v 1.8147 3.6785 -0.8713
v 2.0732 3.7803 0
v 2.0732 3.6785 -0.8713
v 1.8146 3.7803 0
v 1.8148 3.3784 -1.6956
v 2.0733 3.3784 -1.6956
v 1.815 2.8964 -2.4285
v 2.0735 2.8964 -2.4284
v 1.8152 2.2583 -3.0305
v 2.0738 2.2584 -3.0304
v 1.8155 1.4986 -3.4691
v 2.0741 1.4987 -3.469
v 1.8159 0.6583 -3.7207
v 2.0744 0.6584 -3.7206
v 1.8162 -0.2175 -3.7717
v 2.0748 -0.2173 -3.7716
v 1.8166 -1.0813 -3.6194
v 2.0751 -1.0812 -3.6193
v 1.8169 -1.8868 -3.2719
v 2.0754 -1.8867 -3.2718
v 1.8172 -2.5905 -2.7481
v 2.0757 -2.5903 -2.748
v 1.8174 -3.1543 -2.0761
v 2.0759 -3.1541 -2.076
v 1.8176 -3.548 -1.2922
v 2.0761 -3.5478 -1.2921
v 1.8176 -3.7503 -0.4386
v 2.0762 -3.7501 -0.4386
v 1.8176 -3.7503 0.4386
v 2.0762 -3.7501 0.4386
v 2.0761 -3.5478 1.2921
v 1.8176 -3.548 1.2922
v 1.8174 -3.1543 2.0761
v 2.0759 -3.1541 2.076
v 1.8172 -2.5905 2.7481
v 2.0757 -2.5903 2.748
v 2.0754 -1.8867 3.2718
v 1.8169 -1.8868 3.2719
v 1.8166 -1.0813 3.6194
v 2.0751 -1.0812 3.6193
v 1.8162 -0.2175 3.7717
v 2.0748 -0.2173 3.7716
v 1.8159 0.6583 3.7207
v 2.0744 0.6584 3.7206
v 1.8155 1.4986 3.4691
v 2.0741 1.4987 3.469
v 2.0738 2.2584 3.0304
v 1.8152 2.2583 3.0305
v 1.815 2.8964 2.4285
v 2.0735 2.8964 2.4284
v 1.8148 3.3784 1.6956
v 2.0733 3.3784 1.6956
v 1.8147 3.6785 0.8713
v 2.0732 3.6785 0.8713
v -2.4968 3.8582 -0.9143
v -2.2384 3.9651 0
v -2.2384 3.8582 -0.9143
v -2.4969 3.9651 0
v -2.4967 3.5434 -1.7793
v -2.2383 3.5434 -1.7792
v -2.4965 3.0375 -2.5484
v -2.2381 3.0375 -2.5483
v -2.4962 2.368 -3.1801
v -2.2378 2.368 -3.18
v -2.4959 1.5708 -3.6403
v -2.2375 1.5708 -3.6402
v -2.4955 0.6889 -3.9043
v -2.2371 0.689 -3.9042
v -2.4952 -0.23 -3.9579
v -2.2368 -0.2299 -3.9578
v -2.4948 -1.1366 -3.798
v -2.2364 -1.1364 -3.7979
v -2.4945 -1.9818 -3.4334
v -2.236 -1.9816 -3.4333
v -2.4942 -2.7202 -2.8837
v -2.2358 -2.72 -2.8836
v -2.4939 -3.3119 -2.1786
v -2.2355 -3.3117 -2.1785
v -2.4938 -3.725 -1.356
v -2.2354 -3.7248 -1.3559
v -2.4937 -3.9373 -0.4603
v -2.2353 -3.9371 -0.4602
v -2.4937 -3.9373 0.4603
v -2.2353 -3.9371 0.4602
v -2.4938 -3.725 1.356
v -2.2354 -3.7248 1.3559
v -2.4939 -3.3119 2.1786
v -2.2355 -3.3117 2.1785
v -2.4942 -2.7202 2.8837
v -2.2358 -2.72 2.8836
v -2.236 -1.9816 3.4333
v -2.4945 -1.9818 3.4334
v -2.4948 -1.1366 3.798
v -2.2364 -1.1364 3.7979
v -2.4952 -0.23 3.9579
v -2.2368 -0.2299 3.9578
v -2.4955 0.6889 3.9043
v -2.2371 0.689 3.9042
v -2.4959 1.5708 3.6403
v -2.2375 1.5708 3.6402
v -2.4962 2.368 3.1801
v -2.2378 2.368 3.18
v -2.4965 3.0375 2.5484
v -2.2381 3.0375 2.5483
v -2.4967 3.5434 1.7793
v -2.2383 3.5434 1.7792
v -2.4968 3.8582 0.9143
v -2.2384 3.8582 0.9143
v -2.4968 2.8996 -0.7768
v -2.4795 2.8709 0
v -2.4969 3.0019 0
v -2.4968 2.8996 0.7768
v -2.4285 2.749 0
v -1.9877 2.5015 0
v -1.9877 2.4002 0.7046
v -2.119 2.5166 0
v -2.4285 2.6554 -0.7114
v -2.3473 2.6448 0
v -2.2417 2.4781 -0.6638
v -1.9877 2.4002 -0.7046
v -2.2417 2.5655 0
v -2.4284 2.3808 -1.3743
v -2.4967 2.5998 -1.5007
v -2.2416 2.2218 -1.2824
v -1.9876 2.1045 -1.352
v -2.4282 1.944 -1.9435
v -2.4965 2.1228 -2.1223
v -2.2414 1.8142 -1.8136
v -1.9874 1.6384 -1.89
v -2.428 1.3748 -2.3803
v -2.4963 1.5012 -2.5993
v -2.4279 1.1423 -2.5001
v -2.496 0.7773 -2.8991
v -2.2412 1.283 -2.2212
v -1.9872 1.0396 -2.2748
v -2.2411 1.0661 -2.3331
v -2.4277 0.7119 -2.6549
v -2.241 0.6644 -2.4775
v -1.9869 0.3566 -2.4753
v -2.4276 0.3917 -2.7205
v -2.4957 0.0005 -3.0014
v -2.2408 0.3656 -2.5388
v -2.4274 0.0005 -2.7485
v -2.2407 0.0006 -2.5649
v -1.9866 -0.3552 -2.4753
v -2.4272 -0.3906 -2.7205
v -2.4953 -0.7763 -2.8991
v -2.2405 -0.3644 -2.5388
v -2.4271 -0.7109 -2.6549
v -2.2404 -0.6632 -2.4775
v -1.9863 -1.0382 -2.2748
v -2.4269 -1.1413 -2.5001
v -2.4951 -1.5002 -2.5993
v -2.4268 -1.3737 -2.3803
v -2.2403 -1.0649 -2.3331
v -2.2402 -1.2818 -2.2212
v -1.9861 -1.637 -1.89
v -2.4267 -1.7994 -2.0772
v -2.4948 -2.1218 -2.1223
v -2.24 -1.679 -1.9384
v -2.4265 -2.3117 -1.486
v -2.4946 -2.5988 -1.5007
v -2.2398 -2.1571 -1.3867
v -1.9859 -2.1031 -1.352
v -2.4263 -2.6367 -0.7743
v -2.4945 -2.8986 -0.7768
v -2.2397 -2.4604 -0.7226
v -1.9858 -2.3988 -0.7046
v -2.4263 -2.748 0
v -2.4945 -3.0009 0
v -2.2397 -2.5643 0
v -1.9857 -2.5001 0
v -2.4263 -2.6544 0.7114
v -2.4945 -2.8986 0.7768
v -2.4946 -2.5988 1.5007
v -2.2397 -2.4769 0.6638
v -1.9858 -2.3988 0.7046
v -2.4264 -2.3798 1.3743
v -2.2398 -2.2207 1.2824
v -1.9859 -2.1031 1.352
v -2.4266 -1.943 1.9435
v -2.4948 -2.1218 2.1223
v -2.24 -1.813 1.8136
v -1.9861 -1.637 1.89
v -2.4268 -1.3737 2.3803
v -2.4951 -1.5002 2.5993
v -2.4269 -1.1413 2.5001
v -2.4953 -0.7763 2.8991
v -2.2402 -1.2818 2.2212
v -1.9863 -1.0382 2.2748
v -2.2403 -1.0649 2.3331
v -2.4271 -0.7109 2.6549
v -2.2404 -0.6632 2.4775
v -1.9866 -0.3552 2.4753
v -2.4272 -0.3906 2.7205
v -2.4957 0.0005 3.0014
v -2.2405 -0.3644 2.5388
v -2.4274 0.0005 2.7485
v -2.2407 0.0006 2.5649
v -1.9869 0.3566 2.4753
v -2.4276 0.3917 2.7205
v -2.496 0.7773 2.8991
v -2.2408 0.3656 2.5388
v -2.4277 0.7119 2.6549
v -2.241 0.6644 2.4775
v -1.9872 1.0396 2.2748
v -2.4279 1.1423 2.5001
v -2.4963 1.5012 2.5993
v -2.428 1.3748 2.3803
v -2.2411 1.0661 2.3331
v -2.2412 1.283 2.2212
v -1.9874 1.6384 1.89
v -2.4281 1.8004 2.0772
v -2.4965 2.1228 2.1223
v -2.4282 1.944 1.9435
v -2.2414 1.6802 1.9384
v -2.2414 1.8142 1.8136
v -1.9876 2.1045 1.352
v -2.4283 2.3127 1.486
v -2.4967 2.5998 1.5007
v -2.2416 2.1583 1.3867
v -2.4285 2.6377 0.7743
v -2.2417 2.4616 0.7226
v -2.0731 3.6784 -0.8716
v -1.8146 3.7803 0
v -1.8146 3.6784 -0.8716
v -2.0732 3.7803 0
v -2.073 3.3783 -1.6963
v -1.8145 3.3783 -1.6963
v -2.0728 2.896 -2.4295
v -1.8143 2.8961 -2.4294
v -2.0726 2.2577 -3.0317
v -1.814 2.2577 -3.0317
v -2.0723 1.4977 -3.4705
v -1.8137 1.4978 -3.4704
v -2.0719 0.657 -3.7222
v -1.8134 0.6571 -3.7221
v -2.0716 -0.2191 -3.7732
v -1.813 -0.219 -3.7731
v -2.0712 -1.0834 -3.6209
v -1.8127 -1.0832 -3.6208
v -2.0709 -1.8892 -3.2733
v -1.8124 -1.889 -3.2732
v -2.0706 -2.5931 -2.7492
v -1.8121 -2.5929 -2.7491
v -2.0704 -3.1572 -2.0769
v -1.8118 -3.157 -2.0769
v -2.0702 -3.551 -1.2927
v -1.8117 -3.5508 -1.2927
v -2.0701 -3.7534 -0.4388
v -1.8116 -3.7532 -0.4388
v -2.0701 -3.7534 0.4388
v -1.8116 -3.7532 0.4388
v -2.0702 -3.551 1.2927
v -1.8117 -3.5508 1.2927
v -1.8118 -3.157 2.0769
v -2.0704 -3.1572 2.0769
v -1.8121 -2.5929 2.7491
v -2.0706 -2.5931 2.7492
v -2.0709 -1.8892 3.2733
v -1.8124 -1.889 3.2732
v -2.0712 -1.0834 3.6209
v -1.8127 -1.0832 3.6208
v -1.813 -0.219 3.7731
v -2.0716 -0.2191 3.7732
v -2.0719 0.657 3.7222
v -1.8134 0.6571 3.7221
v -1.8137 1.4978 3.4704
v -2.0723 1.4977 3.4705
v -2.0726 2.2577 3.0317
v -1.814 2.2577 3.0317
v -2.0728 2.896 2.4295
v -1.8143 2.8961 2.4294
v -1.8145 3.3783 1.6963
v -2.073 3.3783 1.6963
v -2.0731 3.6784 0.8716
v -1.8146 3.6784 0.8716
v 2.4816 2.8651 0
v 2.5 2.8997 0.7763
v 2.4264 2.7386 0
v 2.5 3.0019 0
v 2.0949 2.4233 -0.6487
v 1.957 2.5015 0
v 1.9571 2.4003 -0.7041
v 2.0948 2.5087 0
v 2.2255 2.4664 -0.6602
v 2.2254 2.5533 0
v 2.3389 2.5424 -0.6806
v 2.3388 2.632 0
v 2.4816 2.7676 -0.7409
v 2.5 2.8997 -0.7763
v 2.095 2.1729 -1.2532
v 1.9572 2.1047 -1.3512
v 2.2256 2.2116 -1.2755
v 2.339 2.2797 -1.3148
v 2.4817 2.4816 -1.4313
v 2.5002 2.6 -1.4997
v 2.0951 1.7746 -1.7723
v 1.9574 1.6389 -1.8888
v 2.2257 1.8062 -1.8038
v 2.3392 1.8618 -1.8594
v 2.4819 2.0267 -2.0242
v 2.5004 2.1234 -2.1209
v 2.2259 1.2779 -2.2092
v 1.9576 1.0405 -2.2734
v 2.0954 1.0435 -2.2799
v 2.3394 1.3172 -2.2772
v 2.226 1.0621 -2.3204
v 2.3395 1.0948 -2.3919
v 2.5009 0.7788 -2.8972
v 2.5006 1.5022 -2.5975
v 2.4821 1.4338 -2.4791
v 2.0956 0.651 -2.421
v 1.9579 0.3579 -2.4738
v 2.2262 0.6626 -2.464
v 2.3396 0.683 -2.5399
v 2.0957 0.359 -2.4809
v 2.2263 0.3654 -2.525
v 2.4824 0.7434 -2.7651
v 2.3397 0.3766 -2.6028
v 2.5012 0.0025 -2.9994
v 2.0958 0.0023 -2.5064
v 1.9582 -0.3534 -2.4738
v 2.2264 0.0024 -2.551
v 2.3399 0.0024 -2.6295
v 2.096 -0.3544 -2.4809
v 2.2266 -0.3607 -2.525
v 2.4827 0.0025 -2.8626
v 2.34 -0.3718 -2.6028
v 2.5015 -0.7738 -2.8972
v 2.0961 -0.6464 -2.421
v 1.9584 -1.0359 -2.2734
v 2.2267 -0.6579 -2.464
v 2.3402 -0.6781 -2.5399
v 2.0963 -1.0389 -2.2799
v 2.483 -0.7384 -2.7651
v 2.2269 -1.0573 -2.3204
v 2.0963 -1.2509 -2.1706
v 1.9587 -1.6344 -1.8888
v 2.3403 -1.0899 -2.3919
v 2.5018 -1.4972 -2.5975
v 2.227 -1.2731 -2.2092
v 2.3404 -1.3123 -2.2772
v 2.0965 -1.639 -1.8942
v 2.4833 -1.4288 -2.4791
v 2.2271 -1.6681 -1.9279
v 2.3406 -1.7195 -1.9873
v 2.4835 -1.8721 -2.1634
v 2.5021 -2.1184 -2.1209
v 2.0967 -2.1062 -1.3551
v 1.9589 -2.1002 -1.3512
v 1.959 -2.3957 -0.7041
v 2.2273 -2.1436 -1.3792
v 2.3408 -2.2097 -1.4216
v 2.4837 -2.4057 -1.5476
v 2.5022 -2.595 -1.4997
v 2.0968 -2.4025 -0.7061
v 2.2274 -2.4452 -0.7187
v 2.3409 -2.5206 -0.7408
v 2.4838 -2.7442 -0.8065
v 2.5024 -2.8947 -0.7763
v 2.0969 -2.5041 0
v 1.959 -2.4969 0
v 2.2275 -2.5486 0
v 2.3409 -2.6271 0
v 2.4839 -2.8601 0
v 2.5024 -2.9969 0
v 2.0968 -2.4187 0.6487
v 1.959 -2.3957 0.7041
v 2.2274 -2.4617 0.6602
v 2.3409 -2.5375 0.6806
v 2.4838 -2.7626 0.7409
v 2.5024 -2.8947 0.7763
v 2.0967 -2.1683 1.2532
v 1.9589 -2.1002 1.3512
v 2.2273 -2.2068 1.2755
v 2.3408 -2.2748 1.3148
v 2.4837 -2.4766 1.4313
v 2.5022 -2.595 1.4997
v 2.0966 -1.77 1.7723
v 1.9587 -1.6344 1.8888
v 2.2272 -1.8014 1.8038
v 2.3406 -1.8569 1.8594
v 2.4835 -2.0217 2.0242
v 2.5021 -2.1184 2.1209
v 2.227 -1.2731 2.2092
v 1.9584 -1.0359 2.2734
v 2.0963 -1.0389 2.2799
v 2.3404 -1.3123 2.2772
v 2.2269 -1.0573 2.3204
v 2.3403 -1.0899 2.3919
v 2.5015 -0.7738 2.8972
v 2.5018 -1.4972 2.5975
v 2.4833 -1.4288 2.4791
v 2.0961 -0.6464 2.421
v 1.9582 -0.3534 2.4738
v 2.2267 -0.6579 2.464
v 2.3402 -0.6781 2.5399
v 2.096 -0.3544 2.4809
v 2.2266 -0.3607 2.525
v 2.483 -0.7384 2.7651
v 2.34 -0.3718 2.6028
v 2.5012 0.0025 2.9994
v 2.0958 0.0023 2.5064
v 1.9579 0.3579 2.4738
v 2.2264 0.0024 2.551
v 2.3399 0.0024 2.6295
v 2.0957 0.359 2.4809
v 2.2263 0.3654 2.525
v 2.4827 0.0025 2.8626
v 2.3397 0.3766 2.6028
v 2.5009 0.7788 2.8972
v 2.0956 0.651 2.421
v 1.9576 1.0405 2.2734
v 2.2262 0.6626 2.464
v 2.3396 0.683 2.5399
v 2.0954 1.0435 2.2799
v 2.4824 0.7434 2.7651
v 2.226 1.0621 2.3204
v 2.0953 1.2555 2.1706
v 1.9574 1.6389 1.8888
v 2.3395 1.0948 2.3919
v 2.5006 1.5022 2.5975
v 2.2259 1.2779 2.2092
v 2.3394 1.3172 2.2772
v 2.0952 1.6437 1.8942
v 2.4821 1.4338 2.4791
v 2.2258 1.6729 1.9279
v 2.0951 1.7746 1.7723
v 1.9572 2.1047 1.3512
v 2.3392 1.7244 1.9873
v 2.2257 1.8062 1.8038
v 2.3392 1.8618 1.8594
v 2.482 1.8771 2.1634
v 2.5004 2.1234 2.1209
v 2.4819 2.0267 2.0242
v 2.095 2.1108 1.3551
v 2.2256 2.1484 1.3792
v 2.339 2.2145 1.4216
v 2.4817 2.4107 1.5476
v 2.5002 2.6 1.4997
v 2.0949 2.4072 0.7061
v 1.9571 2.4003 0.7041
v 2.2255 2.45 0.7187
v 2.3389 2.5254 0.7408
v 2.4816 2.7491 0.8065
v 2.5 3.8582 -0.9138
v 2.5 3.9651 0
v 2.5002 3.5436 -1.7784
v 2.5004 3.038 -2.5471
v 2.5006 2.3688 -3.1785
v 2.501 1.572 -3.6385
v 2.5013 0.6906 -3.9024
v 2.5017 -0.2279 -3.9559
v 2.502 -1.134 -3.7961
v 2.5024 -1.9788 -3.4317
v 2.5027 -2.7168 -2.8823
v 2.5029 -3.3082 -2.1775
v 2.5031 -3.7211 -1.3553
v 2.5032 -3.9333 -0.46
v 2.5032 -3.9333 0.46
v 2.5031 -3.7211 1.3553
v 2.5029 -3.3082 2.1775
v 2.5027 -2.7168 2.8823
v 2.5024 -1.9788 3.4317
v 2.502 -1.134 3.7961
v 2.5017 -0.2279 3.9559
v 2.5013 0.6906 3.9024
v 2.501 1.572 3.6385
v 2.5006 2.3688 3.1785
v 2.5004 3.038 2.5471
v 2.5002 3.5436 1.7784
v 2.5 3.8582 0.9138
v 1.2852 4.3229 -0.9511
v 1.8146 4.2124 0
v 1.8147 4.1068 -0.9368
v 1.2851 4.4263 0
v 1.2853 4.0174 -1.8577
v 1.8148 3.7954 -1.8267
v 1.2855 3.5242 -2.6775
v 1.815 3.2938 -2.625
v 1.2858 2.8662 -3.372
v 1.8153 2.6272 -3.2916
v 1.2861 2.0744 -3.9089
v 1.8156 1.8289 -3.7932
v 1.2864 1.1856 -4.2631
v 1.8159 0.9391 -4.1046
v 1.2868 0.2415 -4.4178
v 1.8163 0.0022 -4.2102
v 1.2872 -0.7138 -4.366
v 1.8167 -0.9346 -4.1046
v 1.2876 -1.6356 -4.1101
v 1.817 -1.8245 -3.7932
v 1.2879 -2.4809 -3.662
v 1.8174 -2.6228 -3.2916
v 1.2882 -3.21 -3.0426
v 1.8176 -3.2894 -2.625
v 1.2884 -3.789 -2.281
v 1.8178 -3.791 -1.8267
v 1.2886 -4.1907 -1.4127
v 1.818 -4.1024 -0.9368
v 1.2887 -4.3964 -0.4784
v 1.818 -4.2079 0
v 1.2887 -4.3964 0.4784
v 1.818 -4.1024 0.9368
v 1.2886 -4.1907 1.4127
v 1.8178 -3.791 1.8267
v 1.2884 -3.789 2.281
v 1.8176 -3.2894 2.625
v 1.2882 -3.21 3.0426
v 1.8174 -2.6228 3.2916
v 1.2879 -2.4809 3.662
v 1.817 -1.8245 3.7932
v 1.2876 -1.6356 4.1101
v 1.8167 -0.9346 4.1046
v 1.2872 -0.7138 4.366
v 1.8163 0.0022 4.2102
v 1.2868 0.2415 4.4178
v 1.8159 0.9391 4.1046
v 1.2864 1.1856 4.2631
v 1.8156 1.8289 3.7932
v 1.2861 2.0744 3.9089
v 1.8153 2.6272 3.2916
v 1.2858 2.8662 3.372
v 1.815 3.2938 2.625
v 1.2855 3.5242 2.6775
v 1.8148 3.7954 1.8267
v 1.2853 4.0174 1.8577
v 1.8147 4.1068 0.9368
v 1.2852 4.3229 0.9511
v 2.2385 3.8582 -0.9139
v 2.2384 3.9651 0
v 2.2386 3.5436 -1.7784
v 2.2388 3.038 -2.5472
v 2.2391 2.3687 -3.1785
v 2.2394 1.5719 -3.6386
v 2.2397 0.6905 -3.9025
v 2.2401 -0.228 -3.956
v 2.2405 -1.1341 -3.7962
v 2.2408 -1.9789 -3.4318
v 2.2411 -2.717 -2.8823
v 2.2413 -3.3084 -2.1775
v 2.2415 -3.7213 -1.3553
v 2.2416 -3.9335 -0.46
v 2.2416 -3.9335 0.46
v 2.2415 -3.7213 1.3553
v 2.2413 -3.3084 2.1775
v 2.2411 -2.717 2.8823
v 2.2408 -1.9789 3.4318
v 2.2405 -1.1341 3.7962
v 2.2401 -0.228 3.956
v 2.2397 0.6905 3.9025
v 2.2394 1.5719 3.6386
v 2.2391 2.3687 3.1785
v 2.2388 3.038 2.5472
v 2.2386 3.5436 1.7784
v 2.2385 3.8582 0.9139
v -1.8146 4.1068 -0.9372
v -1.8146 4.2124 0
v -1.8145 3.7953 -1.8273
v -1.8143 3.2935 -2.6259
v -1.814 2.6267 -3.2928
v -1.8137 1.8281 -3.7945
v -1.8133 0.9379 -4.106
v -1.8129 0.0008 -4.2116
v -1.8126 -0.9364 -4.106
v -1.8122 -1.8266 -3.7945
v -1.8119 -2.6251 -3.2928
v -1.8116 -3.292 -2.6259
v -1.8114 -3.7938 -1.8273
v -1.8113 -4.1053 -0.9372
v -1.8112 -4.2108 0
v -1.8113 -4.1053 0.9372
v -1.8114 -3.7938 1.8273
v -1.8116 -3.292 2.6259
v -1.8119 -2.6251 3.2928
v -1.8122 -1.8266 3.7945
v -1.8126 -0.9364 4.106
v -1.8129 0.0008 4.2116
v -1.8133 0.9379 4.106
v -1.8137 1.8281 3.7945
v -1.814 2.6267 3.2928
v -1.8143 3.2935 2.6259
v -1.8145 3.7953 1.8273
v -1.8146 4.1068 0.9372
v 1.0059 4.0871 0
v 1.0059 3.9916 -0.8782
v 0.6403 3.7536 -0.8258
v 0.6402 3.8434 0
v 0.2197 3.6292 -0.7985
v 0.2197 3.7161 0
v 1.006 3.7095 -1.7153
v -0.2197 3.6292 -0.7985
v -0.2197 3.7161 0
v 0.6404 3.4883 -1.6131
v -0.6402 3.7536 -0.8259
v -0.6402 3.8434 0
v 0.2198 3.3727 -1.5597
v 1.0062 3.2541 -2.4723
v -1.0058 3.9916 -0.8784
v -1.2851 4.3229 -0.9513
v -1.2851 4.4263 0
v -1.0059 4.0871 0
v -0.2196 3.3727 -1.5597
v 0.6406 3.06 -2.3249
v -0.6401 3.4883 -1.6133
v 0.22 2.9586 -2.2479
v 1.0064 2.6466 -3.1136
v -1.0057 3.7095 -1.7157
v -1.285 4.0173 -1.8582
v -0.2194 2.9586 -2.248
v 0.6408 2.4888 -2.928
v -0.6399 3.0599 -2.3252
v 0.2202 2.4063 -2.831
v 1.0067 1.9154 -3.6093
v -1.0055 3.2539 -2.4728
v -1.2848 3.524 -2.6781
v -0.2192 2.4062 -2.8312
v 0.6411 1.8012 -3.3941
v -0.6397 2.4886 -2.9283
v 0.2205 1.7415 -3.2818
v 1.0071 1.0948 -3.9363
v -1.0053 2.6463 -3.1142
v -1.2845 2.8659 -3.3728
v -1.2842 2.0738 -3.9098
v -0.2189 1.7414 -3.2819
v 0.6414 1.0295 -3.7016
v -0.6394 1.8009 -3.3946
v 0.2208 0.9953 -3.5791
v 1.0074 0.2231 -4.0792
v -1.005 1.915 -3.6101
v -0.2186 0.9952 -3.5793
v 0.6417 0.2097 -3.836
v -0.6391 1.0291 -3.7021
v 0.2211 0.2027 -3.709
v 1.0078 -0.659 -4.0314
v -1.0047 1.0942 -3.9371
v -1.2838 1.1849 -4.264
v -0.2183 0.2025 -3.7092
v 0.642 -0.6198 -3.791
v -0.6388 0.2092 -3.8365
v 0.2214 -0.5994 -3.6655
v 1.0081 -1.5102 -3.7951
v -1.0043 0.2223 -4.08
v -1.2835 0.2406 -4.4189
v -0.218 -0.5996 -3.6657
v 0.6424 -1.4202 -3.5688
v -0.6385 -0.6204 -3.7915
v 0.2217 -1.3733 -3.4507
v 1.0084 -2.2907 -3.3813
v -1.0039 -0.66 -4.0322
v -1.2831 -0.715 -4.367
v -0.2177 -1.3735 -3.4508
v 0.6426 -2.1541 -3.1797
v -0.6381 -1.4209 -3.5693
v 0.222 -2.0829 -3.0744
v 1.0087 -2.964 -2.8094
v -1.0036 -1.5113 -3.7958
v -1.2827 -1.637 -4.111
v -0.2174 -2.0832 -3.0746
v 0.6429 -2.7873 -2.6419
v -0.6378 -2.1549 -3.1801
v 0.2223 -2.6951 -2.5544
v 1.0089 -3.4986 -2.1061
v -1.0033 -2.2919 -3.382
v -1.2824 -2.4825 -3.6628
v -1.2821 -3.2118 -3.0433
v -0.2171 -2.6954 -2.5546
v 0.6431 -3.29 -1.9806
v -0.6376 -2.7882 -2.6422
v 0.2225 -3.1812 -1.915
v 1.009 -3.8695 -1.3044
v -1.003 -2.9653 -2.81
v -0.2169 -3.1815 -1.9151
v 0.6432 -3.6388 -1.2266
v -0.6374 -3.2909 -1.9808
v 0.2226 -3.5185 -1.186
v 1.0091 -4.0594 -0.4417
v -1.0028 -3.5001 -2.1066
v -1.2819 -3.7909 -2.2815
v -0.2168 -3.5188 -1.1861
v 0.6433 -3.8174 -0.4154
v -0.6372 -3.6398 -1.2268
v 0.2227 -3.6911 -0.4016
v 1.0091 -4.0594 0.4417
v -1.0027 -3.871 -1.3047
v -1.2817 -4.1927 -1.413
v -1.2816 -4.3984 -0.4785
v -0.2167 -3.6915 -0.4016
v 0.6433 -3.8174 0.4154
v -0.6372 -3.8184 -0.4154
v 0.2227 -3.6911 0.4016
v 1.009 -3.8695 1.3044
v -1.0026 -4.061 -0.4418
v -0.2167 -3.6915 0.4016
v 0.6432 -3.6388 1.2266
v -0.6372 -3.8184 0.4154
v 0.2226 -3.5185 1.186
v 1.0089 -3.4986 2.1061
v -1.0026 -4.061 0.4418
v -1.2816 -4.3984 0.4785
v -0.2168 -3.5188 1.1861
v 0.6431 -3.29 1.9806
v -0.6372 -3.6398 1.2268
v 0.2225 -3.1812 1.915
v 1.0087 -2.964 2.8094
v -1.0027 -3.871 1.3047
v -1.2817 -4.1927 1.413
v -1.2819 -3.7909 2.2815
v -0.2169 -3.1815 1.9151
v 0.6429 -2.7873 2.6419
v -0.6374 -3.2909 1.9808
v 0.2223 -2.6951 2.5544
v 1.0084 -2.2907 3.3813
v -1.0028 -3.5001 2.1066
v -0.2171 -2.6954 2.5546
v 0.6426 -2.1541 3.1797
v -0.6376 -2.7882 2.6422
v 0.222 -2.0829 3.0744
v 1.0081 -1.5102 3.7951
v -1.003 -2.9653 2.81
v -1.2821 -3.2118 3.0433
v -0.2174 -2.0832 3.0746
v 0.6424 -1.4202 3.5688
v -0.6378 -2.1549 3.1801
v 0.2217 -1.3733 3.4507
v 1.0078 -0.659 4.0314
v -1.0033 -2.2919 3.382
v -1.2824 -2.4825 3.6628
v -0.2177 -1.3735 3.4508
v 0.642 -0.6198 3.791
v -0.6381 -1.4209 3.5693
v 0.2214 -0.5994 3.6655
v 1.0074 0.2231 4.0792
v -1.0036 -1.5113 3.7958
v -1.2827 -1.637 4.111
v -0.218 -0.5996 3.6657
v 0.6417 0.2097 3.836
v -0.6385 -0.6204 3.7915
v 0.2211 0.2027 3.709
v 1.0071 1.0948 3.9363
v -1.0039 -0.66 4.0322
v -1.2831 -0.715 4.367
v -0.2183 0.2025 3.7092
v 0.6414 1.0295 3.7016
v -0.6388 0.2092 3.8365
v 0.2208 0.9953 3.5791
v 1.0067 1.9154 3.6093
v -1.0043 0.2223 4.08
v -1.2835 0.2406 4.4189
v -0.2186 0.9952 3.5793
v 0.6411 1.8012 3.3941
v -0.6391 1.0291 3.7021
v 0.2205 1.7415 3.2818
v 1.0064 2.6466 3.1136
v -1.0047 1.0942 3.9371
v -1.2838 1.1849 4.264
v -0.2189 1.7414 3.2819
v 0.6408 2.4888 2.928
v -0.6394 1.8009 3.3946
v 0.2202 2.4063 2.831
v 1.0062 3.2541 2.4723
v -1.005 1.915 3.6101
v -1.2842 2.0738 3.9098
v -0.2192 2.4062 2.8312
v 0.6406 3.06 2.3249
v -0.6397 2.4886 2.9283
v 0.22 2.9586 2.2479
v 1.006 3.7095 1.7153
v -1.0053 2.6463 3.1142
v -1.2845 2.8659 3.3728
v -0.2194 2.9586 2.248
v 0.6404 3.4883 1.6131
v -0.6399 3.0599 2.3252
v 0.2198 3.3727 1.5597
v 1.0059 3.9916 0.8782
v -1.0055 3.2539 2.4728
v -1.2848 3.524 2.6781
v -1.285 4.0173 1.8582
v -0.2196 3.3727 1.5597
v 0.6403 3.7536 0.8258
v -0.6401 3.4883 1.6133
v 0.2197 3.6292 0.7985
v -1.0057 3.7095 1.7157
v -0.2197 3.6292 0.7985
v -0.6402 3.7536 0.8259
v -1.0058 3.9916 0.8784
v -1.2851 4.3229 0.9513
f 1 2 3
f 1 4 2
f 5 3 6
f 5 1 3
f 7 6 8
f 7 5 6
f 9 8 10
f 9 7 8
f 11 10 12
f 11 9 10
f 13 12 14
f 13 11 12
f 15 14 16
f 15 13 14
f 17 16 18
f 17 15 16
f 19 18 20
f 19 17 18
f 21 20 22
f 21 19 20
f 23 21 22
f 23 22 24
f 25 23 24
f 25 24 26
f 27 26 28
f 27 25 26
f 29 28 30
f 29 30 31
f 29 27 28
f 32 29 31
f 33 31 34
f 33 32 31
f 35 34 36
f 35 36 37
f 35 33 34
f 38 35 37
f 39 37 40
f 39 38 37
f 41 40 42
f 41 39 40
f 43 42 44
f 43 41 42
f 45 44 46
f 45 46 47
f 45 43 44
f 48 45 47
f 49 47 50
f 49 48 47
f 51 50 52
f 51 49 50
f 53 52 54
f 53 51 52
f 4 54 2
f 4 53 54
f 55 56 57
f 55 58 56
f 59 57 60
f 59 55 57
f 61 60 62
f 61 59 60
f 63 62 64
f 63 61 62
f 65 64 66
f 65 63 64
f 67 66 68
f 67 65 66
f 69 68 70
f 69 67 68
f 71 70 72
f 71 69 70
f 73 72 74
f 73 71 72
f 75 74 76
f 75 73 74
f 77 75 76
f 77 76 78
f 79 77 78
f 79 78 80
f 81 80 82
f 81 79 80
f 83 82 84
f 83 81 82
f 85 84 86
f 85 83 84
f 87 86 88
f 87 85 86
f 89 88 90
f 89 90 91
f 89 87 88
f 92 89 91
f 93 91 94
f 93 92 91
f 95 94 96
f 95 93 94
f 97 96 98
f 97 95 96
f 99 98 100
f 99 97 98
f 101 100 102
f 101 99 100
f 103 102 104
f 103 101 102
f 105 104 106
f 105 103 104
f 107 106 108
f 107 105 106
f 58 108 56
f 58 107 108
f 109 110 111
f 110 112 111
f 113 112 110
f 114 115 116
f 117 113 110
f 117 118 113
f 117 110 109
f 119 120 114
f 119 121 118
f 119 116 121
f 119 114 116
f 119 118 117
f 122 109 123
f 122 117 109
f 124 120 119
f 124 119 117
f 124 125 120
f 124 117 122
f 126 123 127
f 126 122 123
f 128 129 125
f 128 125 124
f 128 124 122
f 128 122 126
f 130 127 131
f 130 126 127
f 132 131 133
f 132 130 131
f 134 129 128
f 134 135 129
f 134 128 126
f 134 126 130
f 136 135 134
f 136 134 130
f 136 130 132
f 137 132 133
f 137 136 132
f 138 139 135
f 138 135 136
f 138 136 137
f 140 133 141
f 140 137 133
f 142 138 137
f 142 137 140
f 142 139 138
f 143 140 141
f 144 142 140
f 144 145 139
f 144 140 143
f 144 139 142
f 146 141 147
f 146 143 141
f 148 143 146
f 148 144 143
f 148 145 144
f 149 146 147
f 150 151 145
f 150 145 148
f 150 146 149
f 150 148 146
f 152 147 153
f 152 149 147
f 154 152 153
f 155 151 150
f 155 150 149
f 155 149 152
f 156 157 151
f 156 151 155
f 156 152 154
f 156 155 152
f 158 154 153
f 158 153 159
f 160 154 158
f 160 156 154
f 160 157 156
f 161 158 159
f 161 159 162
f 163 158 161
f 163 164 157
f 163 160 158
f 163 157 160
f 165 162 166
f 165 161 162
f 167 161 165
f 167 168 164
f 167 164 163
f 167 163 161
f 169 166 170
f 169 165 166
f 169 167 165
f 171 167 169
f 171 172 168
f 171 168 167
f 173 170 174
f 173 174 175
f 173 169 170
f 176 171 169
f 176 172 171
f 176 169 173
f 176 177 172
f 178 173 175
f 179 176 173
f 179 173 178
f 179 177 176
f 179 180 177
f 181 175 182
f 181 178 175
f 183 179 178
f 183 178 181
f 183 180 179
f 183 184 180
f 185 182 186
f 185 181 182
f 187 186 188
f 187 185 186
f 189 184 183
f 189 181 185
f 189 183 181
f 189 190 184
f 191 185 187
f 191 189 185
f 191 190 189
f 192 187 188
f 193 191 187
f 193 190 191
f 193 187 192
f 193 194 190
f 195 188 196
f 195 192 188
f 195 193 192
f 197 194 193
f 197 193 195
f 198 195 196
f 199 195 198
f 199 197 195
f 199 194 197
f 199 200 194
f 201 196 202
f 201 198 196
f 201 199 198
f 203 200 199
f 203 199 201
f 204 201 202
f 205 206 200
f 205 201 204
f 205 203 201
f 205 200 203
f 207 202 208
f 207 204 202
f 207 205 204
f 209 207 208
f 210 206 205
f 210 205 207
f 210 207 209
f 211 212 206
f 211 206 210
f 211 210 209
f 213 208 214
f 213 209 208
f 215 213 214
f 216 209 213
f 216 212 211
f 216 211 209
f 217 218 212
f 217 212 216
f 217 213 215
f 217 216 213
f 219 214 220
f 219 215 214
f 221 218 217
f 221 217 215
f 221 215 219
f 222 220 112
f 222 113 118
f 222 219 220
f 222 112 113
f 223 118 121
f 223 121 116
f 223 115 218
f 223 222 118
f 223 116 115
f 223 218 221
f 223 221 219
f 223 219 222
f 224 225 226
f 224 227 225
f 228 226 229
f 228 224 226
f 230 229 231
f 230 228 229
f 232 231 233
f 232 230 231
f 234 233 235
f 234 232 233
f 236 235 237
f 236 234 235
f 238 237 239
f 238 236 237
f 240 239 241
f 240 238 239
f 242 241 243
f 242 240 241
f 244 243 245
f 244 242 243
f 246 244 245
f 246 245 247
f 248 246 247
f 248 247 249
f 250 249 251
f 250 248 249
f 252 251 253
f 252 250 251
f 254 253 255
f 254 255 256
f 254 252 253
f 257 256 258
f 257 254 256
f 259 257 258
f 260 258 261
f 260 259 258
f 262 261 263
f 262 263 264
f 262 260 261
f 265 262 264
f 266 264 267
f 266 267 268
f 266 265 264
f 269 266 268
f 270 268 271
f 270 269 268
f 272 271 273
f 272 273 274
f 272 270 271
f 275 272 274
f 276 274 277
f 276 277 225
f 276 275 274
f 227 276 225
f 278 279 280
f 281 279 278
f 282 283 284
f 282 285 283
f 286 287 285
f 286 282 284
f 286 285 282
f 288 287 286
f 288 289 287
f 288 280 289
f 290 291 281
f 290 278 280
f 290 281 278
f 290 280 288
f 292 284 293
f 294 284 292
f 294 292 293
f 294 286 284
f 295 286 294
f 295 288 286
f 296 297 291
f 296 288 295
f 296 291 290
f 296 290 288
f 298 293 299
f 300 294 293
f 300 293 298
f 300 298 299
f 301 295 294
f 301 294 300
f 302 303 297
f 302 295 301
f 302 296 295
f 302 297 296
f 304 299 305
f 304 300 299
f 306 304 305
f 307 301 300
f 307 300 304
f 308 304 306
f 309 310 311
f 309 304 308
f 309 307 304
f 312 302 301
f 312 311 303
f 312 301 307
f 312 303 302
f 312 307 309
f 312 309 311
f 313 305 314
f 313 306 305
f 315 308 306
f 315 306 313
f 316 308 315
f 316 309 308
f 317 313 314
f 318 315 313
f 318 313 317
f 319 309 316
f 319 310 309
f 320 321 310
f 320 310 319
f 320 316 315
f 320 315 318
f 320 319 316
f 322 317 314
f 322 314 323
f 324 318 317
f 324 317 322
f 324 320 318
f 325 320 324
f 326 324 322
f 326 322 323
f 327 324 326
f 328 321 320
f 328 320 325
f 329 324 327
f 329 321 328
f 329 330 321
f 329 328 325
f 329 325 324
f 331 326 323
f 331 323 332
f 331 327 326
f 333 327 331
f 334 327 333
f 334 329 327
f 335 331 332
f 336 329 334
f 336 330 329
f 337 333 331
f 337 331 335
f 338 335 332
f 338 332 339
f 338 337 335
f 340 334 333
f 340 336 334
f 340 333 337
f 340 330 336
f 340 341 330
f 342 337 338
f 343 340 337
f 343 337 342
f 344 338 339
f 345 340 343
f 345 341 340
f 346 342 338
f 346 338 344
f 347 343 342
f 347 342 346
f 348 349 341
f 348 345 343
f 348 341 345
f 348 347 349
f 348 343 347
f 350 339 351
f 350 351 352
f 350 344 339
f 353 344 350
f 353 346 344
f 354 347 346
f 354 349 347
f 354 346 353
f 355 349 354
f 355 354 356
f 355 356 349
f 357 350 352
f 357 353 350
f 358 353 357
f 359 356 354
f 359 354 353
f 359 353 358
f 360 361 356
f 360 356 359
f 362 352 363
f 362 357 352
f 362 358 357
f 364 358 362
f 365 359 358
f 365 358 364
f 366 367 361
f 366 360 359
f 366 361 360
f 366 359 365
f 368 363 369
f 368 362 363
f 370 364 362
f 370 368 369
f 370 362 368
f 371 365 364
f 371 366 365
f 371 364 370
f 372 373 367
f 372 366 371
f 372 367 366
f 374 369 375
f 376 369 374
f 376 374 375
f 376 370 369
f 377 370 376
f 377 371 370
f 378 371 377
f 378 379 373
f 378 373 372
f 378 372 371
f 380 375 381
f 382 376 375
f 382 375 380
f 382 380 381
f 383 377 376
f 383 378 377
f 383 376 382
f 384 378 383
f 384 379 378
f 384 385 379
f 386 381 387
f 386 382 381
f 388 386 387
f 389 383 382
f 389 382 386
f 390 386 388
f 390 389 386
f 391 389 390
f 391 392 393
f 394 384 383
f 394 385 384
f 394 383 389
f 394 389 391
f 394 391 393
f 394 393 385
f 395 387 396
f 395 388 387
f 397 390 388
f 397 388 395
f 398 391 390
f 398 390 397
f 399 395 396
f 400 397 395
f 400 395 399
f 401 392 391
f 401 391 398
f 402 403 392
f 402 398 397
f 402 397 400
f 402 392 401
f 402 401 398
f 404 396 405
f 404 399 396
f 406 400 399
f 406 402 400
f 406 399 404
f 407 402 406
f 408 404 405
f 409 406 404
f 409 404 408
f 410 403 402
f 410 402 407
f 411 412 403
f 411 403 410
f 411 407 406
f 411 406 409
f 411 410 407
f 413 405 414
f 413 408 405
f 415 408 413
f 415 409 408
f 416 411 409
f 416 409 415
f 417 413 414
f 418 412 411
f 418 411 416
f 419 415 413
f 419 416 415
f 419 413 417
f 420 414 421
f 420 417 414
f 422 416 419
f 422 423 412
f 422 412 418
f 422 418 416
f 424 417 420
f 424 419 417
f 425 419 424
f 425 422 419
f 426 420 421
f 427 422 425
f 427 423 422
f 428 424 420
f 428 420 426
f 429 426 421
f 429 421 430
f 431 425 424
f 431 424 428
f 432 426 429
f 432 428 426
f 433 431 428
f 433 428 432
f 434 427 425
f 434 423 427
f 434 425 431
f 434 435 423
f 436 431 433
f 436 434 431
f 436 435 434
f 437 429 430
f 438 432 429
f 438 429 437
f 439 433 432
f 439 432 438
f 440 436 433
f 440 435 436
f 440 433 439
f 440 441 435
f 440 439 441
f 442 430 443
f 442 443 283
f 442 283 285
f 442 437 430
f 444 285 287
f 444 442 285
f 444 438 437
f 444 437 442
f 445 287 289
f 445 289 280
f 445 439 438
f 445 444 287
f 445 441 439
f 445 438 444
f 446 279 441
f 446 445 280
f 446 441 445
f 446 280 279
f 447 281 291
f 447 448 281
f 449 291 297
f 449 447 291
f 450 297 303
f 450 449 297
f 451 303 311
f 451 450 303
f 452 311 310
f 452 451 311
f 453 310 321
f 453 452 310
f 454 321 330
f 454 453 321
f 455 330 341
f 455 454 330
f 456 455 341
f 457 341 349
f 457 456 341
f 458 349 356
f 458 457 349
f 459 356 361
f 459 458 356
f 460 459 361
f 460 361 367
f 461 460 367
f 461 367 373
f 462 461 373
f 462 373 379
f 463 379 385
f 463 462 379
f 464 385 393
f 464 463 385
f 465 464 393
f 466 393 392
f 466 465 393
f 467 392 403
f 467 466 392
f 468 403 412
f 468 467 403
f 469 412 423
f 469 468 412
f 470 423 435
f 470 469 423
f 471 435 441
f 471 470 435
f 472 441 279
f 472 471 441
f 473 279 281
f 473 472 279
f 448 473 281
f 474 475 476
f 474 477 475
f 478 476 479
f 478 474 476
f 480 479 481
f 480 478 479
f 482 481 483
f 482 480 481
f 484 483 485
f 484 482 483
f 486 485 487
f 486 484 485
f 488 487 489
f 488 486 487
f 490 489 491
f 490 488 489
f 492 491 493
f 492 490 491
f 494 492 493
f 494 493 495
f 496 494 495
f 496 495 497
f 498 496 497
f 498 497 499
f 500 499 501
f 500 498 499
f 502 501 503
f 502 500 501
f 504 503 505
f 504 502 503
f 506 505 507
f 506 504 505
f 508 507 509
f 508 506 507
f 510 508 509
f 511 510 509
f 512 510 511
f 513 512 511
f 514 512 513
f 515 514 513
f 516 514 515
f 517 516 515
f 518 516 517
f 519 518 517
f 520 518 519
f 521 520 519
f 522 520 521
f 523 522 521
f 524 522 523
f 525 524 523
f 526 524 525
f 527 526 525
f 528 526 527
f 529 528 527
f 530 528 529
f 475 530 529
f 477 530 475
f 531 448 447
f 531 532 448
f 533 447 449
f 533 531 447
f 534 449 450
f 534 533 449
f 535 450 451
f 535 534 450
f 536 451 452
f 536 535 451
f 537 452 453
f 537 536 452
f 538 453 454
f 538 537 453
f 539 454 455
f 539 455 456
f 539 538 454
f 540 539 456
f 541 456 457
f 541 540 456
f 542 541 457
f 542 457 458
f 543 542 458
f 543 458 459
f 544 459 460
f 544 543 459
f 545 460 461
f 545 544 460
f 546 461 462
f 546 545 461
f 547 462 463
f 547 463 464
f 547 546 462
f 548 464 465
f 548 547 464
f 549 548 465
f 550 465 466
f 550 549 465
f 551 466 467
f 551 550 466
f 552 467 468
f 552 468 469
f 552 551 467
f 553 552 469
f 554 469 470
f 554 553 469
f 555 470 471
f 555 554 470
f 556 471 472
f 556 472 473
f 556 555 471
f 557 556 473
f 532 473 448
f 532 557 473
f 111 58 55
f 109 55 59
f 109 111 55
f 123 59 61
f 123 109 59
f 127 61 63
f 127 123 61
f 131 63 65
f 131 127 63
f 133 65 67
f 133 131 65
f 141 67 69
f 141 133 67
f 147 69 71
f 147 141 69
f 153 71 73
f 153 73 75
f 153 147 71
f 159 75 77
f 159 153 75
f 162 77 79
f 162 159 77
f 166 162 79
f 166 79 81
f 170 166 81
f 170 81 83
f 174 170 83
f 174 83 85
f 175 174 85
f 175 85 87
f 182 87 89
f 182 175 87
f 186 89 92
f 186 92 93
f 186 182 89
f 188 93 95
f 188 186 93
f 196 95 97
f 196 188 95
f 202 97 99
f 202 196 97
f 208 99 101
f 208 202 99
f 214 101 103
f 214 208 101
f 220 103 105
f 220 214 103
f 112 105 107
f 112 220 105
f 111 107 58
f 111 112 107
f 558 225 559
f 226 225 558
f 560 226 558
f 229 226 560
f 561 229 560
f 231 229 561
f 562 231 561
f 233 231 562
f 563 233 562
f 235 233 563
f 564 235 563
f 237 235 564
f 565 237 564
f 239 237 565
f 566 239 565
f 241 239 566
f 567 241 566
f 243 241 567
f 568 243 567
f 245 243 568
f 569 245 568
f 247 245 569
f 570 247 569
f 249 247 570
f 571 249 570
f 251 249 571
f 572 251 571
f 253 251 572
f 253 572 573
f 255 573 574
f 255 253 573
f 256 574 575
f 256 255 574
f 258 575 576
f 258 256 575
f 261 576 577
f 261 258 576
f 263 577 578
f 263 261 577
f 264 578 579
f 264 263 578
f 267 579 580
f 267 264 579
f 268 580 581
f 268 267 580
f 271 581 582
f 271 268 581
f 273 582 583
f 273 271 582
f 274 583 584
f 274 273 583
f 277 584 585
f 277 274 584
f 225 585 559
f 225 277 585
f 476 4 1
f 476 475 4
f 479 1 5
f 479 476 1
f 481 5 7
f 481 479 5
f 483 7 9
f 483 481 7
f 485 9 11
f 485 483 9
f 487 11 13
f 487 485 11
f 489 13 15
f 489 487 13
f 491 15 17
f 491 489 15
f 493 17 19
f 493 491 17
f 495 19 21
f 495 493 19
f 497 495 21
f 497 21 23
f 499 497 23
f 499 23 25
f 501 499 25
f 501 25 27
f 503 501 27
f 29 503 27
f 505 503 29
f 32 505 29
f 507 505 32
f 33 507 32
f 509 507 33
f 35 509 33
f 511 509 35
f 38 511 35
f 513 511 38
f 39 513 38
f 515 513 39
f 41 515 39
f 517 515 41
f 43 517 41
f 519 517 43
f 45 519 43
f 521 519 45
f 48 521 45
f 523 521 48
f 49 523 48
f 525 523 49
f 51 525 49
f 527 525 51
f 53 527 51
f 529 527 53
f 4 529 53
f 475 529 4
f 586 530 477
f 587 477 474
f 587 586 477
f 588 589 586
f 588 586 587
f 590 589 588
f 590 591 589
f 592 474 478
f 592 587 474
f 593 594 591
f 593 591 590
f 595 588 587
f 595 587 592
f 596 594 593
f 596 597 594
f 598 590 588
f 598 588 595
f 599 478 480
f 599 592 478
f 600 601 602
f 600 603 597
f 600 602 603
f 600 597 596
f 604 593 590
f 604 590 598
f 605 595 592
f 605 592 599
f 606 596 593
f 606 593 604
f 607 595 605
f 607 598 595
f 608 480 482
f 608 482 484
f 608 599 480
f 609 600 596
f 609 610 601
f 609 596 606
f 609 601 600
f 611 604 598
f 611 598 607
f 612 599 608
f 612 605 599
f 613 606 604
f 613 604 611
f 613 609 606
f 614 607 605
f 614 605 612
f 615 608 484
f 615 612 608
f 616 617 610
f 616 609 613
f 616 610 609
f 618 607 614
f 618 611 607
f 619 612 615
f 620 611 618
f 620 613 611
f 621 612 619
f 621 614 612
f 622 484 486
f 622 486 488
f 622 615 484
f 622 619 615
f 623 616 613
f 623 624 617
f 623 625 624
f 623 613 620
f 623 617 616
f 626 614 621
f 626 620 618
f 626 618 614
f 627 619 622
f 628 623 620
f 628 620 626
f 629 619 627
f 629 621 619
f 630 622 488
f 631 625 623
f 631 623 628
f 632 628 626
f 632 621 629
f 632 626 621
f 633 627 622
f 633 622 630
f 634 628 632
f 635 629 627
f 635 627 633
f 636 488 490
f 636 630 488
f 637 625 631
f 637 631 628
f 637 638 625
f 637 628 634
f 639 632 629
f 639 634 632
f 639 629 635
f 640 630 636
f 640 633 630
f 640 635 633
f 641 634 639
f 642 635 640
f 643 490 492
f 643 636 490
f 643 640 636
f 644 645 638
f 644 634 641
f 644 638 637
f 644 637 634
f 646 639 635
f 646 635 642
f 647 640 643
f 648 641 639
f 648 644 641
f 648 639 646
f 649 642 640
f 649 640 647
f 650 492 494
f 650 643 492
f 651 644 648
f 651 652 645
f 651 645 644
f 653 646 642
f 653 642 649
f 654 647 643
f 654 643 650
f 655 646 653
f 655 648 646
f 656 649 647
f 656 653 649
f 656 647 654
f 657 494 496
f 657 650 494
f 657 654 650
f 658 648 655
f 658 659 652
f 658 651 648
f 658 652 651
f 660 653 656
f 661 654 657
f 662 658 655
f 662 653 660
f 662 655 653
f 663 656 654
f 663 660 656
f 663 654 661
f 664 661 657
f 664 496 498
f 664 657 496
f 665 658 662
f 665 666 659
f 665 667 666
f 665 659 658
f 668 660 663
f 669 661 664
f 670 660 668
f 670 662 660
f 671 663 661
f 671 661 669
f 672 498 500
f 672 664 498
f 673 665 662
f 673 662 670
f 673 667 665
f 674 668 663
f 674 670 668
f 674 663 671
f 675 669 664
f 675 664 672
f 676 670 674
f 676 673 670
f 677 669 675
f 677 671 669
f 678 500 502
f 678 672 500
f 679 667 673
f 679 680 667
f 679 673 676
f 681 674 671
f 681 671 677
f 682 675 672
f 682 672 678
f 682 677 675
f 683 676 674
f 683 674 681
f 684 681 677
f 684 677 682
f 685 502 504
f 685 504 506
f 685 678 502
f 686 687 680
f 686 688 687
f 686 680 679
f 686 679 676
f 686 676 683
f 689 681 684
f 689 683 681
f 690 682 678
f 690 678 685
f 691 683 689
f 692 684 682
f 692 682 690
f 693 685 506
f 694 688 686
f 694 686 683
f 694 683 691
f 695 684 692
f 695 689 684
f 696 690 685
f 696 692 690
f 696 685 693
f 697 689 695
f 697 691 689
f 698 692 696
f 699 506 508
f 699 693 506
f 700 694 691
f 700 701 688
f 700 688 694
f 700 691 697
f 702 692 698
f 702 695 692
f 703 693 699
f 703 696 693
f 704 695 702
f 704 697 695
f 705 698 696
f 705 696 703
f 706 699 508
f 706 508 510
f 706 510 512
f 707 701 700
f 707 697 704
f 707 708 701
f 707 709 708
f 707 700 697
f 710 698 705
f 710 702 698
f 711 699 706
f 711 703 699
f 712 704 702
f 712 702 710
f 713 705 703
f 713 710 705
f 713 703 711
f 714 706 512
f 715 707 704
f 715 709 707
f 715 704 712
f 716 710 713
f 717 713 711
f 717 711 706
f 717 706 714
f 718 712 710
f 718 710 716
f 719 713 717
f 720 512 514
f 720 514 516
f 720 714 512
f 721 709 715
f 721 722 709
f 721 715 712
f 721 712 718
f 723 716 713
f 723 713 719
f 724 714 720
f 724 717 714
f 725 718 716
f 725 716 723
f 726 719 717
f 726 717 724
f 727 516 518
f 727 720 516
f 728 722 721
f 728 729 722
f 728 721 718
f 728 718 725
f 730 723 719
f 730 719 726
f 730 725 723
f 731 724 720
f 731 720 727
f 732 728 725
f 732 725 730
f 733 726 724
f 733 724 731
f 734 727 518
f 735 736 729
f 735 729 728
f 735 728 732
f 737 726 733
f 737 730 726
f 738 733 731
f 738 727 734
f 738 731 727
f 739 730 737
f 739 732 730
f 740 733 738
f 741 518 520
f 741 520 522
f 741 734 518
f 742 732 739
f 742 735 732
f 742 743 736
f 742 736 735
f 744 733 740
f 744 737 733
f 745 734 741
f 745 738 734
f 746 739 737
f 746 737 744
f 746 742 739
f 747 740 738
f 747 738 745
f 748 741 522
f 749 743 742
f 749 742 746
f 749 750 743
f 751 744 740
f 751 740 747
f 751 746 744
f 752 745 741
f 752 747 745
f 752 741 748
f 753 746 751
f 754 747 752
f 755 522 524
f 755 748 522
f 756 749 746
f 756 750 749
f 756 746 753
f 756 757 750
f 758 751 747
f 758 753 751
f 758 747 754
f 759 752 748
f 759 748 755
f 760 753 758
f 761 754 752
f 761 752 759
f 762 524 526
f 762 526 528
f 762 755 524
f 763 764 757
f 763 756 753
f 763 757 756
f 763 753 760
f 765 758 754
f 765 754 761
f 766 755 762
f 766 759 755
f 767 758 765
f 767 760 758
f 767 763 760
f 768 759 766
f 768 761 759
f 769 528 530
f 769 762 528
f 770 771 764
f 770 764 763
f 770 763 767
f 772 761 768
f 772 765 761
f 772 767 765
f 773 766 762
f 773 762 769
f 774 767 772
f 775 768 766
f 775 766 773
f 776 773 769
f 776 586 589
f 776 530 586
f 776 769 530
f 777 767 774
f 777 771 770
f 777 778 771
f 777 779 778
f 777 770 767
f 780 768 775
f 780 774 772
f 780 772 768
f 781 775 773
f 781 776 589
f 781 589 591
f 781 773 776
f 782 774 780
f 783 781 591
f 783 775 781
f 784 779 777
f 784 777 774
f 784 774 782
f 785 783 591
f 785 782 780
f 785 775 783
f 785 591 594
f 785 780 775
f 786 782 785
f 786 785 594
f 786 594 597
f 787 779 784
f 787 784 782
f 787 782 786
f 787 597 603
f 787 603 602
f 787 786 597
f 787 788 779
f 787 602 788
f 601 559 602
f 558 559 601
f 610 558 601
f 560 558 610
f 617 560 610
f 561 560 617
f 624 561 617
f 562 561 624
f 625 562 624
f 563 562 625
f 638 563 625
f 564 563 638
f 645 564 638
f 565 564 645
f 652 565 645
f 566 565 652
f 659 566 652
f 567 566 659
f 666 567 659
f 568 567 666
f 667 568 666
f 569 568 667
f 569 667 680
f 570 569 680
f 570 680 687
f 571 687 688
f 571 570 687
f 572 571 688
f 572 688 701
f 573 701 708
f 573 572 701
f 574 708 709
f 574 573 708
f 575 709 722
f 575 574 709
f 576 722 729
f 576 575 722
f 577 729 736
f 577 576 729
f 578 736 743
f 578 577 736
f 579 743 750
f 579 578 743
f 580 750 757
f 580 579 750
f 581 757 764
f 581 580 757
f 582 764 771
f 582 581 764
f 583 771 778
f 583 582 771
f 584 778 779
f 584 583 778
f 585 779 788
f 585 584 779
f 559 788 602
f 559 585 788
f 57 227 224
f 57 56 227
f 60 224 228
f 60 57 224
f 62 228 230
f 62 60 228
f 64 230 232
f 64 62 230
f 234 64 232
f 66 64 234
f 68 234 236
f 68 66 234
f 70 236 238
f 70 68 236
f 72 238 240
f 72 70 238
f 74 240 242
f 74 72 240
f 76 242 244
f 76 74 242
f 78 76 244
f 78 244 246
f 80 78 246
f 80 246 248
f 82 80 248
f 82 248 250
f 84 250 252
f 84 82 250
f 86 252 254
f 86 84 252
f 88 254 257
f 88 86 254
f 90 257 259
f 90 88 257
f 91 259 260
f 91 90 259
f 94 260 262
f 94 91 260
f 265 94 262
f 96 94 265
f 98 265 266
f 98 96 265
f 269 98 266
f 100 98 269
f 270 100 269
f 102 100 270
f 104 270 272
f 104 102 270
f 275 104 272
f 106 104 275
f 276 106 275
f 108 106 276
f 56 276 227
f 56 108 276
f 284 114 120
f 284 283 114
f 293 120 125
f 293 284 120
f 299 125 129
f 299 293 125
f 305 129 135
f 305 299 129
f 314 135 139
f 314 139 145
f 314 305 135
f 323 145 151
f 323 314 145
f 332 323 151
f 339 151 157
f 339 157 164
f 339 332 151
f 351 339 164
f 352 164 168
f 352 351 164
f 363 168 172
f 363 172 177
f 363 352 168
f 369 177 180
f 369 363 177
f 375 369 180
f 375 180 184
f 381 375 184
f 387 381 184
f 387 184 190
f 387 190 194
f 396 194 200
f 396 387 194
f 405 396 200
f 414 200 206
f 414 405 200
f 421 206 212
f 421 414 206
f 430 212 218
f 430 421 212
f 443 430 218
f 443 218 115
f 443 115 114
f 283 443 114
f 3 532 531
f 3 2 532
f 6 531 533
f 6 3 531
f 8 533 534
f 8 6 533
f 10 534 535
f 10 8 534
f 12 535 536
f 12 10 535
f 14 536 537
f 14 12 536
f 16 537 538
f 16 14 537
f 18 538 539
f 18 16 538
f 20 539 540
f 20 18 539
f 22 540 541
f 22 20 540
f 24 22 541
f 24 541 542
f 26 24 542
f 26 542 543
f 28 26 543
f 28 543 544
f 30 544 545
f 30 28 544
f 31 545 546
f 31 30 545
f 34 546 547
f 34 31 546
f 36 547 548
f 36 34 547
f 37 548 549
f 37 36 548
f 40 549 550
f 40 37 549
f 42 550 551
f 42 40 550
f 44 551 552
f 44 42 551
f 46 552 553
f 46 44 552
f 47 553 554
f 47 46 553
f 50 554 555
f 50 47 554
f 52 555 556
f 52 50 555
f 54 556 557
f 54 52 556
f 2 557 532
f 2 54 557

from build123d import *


with BuildPart() as part:
    # Esboço1 → Revolução1 (revolve)
    with BuildSketch(Plane.XY):
        with BuildLine():
            Line((-1.987746966, 2.501488878), (1.957031844, 2.501488878))
            ThreePointArc((1.957031844, 2.501488878), (2.338841632, 2.631957255), (2.5, 3.001860882))
            Line((2.5, 3.001860882), (2.5, 3.965053738))
            Line((2.5, 3.965053738), (2.23843243, 3.965053738))
            Line((2.23843243, 3.965053738), (2.073164994, 3.780299443))
            Line((2.073164994, 3.780299443), (1.814623731, 3.780299443))
            Line((1.814623731, 3.780299443), (1.814623731, 4.212372284))
            Line((1.814623731, 4.212372284), (1.285147612, 4.426320864))
            ThreePointArc((1.285147612, 4.426320864), (0, 3.699881214), (-1.285147612, 4.426320864))
            Line((-1.285147612, 4.426320864), (-1.814623731, 4.212372284))
            Line((-1.814623731, 4.212372284), (-1.814623731, 3.780299443))
            Line((-1.814623731, 3.780299443), (-2.073164994, 3.780299443))
            Line((-2.073164994, 3.780299443), (-2.23843243, 3.965053738))
            Line((-2.23843243, 3.965053738), (-2.496862345, 3.965053738))
            Line((-2.496862345, 3.965053738), (-2.496862345, 3.001860882))
            ThreePointArc((-2.496862345, 3.001860882), (-2.347340579, 2.644803585), (-1.987746966, 2.501488878))
        make_face()
    revolve(axis=Axis((0, 0.001488878, 0), (-0.9999999196990055, -0.000400751771926105, 0)))


solid = part.part
